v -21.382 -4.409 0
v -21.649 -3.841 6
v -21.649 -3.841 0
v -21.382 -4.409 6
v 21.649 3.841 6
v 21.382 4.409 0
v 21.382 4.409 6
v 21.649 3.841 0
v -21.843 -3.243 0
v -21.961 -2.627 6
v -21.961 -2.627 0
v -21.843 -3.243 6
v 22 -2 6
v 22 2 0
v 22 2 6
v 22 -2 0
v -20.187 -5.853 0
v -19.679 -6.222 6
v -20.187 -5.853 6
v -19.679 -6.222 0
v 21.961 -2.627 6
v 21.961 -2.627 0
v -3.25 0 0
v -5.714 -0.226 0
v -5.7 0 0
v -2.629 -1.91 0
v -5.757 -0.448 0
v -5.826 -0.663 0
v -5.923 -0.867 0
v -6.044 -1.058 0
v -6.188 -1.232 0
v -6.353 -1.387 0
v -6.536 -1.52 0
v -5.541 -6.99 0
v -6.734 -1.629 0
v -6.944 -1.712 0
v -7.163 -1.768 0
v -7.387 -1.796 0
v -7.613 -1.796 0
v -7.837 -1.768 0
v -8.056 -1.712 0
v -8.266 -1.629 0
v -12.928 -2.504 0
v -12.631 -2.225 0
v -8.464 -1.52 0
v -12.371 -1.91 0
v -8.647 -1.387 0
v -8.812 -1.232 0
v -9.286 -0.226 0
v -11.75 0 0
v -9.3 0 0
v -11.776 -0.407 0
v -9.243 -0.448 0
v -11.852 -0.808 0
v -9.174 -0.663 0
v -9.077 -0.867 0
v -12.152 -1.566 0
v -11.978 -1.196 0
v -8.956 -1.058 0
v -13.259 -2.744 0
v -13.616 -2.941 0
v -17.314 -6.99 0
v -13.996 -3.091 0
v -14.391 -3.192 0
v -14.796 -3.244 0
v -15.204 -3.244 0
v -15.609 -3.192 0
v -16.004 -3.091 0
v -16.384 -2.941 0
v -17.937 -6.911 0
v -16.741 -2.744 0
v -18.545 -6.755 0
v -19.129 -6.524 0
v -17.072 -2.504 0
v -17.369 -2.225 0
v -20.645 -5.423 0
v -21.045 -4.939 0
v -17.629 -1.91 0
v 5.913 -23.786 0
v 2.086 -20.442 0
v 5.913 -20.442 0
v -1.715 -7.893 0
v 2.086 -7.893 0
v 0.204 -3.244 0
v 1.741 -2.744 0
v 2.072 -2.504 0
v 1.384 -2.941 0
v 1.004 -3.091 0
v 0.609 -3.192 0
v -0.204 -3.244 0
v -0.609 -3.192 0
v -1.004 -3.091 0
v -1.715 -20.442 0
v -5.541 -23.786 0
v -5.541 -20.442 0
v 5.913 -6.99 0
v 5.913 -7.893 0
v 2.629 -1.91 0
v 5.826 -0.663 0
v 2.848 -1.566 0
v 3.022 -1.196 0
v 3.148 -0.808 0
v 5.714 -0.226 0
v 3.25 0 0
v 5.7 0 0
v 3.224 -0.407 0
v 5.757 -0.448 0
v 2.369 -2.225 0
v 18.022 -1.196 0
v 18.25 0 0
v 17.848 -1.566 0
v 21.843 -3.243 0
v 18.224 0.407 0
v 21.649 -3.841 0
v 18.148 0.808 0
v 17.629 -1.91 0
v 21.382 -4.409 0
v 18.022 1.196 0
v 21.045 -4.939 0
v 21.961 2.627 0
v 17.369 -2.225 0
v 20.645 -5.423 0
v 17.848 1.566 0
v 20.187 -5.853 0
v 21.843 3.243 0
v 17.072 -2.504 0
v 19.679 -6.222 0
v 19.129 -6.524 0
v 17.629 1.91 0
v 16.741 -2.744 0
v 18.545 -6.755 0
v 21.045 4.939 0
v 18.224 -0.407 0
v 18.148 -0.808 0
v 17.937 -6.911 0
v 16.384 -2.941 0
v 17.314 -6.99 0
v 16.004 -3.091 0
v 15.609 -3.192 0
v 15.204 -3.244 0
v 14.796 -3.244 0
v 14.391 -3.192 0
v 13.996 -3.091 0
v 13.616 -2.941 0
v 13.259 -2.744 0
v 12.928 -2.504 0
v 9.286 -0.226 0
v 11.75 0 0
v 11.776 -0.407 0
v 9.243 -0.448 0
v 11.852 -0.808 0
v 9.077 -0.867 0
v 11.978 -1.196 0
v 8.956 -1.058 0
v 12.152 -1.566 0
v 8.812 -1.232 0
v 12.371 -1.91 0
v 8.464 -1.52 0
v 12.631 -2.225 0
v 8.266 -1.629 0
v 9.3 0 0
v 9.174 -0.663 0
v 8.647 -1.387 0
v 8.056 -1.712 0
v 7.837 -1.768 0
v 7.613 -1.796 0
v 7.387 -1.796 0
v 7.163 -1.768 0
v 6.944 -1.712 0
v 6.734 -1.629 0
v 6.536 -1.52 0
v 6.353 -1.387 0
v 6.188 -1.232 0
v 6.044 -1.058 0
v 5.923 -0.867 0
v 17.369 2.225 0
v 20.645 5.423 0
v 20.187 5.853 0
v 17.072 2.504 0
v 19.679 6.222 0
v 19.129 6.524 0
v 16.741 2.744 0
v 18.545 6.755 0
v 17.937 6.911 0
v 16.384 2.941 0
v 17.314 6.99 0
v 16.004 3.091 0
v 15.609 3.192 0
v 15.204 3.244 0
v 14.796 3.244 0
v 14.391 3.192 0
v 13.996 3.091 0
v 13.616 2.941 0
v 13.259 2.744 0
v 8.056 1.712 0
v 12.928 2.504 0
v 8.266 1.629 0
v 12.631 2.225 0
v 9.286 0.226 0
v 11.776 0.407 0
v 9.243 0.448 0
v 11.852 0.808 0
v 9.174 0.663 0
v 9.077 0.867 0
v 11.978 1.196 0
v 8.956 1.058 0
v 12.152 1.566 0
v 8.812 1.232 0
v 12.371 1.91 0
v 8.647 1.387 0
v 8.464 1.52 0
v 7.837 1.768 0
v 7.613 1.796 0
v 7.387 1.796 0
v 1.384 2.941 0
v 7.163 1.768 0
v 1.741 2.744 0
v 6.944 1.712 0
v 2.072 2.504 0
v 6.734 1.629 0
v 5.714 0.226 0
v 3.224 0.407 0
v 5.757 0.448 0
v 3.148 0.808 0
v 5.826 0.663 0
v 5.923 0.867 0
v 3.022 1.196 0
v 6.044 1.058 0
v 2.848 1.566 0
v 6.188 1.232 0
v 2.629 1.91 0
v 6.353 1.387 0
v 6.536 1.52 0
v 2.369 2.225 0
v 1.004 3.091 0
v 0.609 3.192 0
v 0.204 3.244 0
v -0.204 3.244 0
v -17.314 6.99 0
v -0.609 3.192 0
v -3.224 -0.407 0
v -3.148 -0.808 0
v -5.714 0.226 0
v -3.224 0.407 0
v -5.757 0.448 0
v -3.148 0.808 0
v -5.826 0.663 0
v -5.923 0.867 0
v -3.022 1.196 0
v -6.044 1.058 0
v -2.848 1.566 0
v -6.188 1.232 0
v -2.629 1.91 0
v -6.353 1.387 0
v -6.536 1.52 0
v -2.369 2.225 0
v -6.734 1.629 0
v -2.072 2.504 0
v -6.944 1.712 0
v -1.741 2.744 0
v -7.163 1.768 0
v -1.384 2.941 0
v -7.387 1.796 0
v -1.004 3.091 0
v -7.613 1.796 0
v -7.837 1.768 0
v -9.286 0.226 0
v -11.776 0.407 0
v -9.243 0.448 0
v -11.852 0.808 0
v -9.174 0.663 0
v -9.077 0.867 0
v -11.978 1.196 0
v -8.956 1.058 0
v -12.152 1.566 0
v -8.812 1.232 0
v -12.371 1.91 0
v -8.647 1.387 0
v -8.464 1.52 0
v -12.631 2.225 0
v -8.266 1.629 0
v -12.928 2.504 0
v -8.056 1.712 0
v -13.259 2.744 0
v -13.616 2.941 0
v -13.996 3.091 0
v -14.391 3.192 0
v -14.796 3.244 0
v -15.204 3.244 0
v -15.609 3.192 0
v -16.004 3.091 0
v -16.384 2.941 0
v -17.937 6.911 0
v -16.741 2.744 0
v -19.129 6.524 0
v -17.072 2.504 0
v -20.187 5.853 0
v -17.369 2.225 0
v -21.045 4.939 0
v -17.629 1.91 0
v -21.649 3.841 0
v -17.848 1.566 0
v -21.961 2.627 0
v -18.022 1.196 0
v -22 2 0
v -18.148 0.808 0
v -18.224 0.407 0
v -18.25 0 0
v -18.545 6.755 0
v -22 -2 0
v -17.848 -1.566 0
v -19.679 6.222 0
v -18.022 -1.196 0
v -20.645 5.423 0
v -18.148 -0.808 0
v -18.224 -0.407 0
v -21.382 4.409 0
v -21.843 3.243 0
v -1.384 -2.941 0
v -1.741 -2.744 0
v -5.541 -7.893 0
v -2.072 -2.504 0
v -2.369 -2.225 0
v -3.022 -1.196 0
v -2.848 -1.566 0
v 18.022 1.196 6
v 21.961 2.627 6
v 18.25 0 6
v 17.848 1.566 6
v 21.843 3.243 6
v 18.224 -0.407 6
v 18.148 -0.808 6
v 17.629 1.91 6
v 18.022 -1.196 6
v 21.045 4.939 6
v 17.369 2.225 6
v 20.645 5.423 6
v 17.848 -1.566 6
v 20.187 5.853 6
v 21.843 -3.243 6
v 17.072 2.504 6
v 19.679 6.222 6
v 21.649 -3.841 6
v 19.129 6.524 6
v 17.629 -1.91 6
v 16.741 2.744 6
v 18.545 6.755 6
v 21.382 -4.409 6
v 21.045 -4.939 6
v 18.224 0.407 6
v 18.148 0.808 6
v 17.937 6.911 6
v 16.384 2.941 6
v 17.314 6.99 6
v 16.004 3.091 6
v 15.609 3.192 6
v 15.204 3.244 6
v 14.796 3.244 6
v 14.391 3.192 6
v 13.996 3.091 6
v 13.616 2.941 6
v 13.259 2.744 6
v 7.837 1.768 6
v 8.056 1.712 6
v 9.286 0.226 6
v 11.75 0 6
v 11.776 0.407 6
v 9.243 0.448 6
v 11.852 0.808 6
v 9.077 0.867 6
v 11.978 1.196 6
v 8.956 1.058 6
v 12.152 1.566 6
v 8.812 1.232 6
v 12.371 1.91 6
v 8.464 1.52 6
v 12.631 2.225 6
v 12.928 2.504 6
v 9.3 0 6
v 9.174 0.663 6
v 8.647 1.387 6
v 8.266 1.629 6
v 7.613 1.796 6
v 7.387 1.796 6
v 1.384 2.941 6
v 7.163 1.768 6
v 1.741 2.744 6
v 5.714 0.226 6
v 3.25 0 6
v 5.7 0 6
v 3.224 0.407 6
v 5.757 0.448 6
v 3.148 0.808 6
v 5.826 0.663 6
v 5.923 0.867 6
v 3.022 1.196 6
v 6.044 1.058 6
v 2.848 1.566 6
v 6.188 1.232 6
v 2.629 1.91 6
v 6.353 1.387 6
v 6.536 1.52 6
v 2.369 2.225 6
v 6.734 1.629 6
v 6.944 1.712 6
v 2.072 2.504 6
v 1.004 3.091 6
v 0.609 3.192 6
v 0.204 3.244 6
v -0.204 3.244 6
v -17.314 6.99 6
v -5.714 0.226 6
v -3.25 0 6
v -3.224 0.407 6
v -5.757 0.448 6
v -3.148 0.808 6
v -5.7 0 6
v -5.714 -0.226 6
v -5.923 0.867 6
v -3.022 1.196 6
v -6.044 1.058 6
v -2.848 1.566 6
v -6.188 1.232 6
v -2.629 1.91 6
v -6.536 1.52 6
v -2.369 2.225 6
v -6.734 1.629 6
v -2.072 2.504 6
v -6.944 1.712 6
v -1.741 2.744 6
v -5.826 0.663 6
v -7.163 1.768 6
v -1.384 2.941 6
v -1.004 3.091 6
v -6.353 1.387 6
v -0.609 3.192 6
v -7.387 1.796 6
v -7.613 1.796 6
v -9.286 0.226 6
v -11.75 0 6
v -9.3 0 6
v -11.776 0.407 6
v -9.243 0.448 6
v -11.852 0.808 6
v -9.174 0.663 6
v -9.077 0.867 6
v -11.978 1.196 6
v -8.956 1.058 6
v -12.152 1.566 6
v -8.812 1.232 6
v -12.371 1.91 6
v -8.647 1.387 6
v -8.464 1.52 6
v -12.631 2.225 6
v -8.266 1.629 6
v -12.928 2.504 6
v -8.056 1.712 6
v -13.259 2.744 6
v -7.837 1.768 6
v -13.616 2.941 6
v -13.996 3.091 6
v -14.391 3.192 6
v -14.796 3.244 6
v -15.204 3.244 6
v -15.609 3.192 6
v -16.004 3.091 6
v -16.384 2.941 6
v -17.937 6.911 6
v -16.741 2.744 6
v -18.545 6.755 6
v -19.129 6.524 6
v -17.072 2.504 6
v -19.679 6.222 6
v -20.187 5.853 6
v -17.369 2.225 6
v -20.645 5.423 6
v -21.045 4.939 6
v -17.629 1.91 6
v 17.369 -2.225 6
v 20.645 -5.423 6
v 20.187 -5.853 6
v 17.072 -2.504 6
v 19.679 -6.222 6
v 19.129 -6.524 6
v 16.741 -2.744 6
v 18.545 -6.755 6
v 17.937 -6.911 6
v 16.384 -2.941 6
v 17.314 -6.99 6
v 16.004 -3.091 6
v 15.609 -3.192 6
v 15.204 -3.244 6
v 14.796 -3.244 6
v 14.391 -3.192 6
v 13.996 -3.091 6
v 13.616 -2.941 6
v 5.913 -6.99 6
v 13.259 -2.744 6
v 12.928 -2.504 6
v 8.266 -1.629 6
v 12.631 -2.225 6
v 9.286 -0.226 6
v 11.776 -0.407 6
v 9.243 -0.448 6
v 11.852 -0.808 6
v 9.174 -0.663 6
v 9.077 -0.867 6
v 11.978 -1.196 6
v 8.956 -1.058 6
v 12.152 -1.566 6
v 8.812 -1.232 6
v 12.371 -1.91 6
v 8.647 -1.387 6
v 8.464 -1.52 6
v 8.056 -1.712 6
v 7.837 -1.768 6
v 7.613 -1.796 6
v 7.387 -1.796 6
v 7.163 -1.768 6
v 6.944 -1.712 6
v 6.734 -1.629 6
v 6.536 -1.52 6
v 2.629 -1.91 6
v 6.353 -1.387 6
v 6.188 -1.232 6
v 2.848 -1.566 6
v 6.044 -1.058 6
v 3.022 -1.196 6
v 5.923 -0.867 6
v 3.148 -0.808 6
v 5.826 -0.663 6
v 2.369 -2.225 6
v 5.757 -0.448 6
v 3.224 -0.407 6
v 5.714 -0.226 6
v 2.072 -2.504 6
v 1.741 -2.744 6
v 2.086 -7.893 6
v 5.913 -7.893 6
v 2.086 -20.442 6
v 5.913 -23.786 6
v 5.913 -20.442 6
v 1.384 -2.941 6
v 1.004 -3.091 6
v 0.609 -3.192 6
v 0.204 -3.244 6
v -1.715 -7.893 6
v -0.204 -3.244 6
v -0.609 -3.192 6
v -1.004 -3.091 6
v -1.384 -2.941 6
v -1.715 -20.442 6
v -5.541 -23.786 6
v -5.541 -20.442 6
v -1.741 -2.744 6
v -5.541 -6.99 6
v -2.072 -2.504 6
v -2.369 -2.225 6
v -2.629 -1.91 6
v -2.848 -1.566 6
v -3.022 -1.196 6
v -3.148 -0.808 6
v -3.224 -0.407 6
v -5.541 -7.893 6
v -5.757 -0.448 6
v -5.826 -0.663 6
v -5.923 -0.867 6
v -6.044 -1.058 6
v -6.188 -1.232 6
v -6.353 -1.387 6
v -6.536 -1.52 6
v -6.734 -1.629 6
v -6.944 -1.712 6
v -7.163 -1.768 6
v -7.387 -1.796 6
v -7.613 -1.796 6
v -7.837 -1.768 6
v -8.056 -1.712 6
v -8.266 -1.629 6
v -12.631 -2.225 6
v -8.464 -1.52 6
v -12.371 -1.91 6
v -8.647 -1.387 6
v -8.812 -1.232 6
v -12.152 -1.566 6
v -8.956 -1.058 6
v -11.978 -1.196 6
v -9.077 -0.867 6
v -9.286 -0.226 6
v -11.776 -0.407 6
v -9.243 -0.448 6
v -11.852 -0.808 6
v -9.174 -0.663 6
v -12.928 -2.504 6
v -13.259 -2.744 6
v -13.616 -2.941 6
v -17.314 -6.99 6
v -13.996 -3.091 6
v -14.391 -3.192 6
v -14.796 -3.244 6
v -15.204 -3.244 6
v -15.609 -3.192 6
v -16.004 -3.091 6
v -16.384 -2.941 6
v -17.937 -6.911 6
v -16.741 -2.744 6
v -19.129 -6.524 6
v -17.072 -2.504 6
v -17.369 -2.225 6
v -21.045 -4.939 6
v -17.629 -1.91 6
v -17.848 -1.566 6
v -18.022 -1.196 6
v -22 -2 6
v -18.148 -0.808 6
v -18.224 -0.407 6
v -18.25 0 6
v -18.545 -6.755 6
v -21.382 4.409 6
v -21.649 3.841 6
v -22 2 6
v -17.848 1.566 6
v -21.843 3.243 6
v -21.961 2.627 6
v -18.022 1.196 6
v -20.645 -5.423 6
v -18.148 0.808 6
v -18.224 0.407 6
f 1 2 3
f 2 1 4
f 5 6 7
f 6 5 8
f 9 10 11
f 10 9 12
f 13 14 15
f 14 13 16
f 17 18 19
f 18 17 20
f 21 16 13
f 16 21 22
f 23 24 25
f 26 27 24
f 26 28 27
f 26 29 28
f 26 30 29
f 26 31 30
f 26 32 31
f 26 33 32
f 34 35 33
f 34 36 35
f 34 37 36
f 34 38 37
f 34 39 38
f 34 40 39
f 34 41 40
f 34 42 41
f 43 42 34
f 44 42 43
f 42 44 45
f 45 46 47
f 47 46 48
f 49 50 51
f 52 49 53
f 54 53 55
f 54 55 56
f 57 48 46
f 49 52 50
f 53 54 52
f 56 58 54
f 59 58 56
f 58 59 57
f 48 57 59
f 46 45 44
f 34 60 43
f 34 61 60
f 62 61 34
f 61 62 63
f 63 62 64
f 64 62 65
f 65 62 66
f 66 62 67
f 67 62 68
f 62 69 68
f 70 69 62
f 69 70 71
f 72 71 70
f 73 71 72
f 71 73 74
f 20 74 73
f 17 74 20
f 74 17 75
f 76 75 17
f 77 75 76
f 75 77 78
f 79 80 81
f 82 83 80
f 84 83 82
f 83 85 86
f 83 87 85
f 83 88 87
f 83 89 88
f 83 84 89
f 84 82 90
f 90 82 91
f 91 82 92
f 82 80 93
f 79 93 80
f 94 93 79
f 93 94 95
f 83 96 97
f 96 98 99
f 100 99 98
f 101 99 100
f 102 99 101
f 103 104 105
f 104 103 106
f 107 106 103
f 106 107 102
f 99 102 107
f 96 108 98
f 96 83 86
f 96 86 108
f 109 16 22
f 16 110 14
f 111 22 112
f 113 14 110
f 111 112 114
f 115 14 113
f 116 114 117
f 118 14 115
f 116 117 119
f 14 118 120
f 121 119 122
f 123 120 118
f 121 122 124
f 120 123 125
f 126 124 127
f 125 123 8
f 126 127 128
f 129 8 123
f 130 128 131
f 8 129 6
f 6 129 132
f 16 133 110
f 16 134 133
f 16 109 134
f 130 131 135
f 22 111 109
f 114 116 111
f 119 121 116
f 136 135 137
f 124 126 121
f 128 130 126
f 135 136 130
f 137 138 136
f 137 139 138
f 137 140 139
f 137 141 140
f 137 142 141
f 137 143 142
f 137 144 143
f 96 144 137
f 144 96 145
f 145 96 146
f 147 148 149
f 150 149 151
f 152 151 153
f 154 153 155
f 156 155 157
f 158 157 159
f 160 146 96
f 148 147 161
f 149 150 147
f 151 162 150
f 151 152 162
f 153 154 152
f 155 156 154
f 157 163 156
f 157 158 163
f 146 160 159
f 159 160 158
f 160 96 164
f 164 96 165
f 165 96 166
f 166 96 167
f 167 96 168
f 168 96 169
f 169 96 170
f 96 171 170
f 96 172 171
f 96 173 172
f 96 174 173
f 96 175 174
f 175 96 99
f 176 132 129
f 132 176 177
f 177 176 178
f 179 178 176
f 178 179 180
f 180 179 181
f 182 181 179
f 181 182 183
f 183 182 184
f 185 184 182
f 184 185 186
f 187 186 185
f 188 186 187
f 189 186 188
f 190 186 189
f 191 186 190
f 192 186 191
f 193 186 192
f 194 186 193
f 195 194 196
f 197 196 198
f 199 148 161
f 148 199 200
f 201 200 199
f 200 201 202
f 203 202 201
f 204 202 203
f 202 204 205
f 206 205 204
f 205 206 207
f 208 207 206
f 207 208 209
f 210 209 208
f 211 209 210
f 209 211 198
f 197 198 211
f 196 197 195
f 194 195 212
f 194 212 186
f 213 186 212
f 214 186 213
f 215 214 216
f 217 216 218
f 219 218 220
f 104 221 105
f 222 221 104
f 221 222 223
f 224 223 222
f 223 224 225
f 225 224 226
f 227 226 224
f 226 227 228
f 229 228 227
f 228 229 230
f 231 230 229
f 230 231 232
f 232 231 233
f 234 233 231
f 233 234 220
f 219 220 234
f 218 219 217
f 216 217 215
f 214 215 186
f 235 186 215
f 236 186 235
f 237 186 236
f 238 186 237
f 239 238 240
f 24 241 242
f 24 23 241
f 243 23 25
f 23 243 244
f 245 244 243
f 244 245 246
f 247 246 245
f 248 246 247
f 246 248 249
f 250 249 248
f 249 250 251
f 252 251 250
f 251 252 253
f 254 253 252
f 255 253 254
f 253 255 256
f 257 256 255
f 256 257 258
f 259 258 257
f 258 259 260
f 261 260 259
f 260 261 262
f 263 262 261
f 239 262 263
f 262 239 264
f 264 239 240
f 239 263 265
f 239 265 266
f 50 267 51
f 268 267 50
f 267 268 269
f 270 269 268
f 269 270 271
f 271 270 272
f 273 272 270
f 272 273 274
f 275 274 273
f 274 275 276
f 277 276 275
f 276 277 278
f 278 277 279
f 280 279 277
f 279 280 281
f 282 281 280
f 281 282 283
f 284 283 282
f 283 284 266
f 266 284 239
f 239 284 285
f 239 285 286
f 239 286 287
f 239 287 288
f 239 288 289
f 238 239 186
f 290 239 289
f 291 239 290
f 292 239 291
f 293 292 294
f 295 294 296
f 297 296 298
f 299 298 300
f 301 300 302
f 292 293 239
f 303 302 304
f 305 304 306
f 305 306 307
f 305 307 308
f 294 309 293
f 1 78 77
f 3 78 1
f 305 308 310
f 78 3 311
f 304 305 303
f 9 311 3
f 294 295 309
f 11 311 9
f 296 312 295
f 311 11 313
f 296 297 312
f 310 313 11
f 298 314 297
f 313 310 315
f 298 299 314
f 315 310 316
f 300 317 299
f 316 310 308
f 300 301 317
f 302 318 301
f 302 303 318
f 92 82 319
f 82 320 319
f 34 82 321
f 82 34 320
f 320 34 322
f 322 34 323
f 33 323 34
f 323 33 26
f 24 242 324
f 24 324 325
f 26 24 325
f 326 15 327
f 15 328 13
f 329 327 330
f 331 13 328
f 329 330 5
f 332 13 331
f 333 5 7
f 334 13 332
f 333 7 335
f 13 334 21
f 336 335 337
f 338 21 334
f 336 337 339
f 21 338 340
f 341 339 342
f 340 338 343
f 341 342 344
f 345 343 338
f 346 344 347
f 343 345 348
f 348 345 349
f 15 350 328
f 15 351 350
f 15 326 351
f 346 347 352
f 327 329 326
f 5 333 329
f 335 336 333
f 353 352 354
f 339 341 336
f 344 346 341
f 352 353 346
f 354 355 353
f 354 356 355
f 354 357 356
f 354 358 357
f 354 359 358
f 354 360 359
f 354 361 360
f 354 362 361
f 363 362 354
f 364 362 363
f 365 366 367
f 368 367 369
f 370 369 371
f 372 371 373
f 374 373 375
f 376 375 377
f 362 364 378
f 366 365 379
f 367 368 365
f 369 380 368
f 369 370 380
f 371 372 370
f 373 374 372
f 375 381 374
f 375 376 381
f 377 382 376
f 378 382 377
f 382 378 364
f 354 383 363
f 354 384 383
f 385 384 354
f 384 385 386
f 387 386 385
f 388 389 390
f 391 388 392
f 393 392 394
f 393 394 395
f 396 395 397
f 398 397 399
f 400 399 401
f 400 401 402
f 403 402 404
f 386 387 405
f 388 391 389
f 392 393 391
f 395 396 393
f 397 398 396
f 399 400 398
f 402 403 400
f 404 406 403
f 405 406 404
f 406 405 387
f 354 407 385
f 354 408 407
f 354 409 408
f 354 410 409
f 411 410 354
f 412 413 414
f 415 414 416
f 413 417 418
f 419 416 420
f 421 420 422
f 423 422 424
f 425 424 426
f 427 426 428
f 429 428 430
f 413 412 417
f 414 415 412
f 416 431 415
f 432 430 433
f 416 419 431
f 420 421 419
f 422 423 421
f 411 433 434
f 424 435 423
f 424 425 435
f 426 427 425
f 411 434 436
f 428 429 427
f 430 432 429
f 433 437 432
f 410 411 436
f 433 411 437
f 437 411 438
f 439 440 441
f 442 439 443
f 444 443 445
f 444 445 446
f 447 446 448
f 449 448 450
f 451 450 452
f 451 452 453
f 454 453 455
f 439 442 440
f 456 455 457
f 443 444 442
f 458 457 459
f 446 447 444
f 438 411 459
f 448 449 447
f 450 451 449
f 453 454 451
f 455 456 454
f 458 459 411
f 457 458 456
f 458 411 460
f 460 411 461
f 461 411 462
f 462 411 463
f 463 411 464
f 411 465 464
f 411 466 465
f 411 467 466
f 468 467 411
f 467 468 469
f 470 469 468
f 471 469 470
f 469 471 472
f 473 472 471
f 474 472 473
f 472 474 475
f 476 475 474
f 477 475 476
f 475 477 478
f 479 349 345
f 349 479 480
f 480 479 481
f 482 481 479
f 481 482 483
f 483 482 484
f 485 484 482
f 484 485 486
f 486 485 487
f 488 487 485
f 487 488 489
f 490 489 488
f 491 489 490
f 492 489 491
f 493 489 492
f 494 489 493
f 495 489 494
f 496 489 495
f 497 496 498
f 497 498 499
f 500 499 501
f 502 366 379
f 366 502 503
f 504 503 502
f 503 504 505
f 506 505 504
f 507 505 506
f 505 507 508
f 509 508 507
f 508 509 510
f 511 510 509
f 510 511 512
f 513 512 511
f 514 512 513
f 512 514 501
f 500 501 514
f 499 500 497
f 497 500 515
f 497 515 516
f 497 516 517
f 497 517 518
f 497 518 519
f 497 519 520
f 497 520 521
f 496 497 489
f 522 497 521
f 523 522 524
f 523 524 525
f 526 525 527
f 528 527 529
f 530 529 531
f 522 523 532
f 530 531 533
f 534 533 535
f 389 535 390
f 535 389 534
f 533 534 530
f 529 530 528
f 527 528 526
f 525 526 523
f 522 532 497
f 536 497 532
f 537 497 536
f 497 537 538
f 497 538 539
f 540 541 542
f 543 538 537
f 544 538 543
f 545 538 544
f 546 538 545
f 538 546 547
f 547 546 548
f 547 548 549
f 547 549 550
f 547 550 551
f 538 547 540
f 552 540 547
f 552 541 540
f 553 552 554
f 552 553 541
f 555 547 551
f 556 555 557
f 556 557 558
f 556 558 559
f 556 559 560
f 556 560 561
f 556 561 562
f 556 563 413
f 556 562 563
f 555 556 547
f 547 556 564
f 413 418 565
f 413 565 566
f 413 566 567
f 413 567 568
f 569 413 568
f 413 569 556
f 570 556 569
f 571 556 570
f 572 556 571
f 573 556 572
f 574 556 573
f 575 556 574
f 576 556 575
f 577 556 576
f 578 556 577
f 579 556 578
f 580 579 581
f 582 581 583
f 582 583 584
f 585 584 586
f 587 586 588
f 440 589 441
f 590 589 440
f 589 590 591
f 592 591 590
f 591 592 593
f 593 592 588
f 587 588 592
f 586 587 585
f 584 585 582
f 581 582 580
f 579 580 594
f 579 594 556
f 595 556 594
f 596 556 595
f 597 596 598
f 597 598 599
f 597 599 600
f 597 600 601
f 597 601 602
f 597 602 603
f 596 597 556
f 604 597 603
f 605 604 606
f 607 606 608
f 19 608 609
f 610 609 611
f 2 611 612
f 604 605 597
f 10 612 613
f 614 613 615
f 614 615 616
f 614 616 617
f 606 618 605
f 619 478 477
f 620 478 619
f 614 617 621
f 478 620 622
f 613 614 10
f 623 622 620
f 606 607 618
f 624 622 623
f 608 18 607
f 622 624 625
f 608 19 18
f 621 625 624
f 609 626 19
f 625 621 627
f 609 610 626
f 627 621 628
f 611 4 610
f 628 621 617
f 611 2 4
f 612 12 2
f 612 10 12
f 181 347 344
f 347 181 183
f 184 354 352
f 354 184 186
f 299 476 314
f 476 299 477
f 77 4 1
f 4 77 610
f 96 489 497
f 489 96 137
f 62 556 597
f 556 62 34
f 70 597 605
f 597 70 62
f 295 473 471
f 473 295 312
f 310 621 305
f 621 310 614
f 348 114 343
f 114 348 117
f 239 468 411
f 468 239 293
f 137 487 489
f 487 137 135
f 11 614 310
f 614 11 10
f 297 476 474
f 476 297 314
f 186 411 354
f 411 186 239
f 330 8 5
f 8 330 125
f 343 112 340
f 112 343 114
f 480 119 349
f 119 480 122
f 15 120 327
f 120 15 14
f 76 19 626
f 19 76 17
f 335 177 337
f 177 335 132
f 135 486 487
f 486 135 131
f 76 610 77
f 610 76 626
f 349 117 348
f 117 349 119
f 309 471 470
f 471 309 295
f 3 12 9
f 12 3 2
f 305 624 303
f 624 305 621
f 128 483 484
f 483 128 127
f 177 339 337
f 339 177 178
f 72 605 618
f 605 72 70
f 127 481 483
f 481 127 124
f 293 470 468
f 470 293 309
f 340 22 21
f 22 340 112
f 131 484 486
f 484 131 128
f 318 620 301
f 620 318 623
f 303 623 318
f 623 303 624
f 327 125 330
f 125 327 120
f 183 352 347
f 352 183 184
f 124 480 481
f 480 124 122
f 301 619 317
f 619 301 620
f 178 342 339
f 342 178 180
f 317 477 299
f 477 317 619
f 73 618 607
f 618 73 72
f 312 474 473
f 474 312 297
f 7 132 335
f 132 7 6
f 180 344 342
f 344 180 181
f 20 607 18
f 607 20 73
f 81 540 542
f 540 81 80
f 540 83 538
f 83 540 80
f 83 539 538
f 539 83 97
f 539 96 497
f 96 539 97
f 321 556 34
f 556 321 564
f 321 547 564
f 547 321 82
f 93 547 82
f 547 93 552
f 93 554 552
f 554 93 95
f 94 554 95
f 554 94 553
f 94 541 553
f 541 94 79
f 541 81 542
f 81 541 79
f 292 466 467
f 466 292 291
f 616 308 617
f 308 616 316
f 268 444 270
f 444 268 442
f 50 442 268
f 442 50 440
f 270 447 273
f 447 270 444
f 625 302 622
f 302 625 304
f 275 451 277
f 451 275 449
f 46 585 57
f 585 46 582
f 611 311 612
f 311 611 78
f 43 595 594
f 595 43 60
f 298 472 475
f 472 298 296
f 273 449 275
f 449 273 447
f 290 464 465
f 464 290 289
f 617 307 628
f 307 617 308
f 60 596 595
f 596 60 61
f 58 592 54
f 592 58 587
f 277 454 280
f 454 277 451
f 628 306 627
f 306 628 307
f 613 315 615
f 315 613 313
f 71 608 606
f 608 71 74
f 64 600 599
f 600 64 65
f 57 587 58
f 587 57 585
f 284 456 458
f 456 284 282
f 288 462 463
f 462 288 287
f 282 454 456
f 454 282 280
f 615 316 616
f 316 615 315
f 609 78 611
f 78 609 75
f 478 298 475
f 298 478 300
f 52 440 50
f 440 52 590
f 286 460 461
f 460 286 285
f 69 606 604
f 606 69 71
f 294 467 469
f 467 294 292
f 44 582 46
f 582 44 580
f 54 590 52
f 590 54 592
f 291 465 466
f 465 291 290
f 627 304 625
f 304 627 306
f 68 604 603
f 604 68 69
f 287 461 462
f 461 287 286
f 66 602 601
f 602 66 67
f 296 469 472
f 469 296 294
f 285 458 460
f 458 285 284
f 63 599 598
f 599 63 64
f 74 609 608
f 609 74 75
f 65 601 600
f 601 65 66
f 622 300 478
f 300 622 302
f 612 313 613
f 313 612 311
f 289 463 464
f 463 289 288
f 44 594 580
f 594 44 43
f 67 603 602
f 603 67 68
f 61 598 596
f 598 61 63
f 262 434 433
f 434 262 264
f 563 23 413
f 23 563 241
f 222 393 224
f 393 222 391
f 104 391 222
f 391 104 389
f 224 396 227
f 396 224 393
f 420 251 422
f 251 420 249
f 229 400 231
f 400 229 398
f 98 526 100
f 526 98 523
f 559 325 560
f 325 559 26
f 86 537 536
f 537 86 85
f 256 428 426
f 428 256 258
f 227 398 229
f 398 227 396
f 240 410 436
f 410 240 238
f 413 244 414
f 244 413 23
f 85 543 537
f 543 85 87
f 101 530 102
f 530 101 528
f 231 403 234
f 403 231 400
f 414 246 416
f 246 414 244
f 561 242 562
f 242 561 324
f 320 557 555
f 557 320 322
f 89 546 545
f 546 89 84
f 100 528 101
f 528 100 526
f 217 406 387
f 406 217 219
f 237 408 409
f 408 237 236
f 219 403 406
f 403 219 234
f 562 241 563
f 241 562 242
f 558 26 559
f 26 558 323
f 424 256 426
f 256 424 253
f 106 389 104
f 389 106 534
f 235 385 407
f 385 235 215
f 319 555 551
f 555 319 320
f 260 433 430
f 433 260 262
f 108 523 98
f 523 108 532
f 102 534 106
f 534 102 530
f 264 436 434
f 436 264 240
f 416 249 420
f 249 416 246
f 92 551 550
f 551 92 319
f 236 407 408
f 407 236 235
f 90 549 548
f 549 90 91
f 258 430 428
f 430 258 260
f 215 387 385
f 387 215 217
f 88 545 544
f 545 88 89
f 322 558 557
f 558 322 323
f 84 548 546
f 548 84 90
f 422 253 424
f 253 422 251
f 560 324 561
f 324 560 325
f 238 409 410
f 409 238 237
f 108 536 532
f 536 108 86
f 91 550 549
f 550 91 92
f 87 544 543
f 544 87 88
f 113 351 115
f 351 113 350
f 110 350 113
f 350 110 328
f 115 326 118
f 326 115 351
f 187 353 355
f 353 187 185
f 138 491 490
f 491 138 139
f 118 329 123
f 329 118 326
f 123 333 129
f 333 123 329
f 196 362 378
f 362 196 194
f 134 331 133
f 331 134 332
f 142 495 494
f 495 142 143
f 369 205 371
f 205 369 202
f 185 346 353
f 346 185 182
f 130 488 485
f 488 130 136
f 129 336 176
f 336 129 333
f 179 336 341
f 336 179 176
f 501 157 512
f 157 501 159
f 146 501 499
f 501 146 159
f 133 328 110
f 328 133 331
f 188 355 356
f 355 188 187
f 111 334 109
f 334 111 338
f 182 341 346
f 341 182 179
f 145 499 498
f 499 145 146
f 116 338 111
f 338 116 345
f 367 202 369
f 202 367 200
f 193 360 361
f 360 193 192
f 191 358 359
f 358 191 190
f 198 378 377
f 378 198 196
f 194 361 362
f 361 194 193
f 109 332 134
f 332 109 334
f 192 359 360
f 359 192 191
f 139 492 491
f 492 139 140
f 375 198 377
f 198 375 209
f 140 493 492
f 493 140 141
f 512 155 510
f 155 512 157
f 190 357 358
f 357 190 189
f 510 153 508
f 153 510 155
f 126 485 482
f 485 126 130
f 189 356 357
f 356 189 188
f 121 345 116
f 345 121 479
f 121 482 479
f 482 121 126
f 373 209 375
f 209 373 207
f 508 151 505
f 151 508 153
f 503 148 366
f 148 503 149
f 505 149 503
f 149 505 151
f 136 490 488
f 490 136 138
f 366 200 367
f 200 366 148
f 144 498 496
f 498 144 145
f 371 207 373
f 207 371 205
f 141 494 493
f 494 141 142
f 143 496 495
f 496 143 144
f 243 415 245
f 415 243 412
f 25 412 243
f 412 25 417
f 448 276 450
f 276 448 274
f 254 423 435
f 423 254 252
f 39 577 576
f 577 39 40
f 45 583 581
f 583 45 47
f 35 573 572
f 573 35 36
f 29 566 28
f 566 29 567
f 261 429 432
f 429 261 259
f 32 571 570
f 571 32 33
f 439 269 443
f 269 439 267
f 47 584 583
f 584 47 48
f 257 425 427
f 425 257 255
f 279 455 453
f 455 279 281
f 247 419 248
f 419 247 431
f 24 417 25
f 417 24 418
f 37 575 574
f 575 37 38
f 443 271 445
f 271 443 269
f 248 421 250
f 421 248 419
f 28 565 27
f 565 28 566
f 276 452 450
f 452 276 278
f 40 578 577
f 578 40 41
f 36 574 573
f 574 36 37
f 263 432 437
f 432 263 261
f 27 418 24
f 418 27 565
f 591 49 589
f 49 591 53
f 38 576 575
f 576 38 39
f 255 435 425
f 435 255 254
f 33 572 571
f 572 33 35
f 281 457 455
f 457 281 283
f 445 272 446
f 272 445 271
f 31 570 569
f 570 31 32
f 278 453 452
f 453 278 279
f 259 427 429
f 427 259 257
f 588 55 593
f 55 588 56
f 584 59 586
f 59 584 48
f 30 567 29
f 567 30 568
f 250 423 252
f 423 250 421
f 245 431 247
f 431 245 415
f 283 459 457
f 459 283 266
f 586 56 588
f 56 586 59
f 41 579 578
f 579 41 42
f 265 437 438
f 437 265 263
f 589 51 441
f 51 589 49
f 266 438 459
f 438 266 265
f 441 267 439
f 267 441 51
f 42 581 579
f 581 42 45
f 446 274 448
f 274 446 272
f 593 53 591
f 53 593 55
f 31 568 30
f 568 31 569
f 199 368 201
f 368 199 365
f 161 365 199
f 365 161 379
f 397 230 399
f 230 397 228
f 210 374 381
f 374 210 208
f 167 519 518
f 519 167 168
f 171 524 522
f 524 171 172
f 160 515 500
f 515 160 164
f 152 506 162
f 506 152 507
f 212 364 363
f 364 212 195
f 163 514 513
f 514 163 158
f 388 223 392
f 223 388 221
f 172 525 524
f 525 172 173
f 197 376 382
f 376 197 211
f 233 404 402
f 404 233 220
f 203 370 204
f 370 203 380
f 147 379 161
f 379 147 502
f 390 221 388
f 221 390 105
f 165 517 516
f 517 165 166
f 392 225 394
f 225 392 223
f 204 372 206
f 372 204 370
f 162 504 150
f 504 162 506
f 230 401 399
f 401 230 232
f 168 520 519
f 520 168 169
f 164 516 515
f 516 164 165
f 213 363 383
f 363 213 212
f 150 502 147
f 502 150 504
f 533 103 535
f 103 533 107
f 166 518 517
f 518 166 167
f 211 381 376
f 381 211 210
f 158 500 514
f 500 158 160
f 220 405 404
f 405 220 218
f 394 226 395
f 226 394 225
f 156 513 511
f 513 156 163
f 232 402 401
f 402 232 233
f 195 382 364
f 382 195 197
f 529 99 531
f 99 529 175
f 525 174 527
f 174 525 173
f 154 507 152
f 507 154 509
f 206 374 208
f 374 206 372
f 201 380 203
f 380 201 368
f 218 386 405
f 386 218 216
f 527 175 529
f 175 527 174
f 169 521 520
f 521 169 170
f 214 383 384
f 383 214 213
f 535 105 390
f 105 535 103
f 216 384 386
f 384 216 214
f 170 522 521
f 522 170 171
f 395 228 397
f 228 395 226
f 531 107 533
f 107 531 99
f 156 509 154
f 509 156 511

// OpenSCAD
$fn = 50;


difference() {
	union() {
		hull() {
			translate(v = [-17.0000000000, 2.0000000000, 0]) {
				cylinder(h = 6, r = 5);
			}
			translate(v = [17.0000000000, 2.0000000000, 0]) {
				cylinder(h = 6, r = 5);
			}
			translate(v = [-17.0000000000, -2.0000000000, 0]) {
				cylinder(h = 6, r = 5);
			}
			translate(v = [17.0000000000, -2.0000000000, 0]) {
				cylinder(h = 6, r = 5);
			}
		}
		translate(v = [0, -5, 0]) {
			linear_extrude(height = 6) {
				text(font = "DejaVu Sans Mono:style=Bold", halign = "center", size = 19.0000000000, text = "I", valign = "top");
			}
		}
	}
	union() {
		translate(v = [-15.0000000000, 0.0000000000, 0]) {
			translate(v = [0, 0, -100]) {
				cylinder(h = 200, r = 3.2500000000);
			}
		}
		translate(v = [0, 0, -100]) {
			cylinder(h = 200, r = 3.2500000000);
		}
		translate(v = [15.0000000000, 0.0000000000, 0]) {
			translate(v = [0, 0, -100]) {
				cylinder(h = 200, r = 3.2500000000);
			}
		}
		translate(v = [-15.0000000000, 0.0000000000, 0]) {
			translate(v = [0, 0, -100]) {
				cylinder(h = 200, r = 1.8000000000);
			}
		}
		translate(v = [-7.5000000000, 0.0000000000, 0]) {
			translate(v = [0, 0, -100]) {
				cylinder(h = 200, r = 1.8000000000);
			}
		}
		translate(v = [0, 0, -100]) {
			cylinder(h = 200, r = 1.8000000000);
		}
		translate(v = [7.5000000000, 0.0000000000, 0]) {
			translate(v = [0, 0, -100]) {
				cylinder(h = 200, r = 1.8000000000);
			}
		}
		translate(v = [15.0000000000, 0.0000000000, 0]) {
			translate(v = [0, 0, -100]) {
				cylinder(h = 200, r = 1.8000000000);
			}
		}
	}
}
